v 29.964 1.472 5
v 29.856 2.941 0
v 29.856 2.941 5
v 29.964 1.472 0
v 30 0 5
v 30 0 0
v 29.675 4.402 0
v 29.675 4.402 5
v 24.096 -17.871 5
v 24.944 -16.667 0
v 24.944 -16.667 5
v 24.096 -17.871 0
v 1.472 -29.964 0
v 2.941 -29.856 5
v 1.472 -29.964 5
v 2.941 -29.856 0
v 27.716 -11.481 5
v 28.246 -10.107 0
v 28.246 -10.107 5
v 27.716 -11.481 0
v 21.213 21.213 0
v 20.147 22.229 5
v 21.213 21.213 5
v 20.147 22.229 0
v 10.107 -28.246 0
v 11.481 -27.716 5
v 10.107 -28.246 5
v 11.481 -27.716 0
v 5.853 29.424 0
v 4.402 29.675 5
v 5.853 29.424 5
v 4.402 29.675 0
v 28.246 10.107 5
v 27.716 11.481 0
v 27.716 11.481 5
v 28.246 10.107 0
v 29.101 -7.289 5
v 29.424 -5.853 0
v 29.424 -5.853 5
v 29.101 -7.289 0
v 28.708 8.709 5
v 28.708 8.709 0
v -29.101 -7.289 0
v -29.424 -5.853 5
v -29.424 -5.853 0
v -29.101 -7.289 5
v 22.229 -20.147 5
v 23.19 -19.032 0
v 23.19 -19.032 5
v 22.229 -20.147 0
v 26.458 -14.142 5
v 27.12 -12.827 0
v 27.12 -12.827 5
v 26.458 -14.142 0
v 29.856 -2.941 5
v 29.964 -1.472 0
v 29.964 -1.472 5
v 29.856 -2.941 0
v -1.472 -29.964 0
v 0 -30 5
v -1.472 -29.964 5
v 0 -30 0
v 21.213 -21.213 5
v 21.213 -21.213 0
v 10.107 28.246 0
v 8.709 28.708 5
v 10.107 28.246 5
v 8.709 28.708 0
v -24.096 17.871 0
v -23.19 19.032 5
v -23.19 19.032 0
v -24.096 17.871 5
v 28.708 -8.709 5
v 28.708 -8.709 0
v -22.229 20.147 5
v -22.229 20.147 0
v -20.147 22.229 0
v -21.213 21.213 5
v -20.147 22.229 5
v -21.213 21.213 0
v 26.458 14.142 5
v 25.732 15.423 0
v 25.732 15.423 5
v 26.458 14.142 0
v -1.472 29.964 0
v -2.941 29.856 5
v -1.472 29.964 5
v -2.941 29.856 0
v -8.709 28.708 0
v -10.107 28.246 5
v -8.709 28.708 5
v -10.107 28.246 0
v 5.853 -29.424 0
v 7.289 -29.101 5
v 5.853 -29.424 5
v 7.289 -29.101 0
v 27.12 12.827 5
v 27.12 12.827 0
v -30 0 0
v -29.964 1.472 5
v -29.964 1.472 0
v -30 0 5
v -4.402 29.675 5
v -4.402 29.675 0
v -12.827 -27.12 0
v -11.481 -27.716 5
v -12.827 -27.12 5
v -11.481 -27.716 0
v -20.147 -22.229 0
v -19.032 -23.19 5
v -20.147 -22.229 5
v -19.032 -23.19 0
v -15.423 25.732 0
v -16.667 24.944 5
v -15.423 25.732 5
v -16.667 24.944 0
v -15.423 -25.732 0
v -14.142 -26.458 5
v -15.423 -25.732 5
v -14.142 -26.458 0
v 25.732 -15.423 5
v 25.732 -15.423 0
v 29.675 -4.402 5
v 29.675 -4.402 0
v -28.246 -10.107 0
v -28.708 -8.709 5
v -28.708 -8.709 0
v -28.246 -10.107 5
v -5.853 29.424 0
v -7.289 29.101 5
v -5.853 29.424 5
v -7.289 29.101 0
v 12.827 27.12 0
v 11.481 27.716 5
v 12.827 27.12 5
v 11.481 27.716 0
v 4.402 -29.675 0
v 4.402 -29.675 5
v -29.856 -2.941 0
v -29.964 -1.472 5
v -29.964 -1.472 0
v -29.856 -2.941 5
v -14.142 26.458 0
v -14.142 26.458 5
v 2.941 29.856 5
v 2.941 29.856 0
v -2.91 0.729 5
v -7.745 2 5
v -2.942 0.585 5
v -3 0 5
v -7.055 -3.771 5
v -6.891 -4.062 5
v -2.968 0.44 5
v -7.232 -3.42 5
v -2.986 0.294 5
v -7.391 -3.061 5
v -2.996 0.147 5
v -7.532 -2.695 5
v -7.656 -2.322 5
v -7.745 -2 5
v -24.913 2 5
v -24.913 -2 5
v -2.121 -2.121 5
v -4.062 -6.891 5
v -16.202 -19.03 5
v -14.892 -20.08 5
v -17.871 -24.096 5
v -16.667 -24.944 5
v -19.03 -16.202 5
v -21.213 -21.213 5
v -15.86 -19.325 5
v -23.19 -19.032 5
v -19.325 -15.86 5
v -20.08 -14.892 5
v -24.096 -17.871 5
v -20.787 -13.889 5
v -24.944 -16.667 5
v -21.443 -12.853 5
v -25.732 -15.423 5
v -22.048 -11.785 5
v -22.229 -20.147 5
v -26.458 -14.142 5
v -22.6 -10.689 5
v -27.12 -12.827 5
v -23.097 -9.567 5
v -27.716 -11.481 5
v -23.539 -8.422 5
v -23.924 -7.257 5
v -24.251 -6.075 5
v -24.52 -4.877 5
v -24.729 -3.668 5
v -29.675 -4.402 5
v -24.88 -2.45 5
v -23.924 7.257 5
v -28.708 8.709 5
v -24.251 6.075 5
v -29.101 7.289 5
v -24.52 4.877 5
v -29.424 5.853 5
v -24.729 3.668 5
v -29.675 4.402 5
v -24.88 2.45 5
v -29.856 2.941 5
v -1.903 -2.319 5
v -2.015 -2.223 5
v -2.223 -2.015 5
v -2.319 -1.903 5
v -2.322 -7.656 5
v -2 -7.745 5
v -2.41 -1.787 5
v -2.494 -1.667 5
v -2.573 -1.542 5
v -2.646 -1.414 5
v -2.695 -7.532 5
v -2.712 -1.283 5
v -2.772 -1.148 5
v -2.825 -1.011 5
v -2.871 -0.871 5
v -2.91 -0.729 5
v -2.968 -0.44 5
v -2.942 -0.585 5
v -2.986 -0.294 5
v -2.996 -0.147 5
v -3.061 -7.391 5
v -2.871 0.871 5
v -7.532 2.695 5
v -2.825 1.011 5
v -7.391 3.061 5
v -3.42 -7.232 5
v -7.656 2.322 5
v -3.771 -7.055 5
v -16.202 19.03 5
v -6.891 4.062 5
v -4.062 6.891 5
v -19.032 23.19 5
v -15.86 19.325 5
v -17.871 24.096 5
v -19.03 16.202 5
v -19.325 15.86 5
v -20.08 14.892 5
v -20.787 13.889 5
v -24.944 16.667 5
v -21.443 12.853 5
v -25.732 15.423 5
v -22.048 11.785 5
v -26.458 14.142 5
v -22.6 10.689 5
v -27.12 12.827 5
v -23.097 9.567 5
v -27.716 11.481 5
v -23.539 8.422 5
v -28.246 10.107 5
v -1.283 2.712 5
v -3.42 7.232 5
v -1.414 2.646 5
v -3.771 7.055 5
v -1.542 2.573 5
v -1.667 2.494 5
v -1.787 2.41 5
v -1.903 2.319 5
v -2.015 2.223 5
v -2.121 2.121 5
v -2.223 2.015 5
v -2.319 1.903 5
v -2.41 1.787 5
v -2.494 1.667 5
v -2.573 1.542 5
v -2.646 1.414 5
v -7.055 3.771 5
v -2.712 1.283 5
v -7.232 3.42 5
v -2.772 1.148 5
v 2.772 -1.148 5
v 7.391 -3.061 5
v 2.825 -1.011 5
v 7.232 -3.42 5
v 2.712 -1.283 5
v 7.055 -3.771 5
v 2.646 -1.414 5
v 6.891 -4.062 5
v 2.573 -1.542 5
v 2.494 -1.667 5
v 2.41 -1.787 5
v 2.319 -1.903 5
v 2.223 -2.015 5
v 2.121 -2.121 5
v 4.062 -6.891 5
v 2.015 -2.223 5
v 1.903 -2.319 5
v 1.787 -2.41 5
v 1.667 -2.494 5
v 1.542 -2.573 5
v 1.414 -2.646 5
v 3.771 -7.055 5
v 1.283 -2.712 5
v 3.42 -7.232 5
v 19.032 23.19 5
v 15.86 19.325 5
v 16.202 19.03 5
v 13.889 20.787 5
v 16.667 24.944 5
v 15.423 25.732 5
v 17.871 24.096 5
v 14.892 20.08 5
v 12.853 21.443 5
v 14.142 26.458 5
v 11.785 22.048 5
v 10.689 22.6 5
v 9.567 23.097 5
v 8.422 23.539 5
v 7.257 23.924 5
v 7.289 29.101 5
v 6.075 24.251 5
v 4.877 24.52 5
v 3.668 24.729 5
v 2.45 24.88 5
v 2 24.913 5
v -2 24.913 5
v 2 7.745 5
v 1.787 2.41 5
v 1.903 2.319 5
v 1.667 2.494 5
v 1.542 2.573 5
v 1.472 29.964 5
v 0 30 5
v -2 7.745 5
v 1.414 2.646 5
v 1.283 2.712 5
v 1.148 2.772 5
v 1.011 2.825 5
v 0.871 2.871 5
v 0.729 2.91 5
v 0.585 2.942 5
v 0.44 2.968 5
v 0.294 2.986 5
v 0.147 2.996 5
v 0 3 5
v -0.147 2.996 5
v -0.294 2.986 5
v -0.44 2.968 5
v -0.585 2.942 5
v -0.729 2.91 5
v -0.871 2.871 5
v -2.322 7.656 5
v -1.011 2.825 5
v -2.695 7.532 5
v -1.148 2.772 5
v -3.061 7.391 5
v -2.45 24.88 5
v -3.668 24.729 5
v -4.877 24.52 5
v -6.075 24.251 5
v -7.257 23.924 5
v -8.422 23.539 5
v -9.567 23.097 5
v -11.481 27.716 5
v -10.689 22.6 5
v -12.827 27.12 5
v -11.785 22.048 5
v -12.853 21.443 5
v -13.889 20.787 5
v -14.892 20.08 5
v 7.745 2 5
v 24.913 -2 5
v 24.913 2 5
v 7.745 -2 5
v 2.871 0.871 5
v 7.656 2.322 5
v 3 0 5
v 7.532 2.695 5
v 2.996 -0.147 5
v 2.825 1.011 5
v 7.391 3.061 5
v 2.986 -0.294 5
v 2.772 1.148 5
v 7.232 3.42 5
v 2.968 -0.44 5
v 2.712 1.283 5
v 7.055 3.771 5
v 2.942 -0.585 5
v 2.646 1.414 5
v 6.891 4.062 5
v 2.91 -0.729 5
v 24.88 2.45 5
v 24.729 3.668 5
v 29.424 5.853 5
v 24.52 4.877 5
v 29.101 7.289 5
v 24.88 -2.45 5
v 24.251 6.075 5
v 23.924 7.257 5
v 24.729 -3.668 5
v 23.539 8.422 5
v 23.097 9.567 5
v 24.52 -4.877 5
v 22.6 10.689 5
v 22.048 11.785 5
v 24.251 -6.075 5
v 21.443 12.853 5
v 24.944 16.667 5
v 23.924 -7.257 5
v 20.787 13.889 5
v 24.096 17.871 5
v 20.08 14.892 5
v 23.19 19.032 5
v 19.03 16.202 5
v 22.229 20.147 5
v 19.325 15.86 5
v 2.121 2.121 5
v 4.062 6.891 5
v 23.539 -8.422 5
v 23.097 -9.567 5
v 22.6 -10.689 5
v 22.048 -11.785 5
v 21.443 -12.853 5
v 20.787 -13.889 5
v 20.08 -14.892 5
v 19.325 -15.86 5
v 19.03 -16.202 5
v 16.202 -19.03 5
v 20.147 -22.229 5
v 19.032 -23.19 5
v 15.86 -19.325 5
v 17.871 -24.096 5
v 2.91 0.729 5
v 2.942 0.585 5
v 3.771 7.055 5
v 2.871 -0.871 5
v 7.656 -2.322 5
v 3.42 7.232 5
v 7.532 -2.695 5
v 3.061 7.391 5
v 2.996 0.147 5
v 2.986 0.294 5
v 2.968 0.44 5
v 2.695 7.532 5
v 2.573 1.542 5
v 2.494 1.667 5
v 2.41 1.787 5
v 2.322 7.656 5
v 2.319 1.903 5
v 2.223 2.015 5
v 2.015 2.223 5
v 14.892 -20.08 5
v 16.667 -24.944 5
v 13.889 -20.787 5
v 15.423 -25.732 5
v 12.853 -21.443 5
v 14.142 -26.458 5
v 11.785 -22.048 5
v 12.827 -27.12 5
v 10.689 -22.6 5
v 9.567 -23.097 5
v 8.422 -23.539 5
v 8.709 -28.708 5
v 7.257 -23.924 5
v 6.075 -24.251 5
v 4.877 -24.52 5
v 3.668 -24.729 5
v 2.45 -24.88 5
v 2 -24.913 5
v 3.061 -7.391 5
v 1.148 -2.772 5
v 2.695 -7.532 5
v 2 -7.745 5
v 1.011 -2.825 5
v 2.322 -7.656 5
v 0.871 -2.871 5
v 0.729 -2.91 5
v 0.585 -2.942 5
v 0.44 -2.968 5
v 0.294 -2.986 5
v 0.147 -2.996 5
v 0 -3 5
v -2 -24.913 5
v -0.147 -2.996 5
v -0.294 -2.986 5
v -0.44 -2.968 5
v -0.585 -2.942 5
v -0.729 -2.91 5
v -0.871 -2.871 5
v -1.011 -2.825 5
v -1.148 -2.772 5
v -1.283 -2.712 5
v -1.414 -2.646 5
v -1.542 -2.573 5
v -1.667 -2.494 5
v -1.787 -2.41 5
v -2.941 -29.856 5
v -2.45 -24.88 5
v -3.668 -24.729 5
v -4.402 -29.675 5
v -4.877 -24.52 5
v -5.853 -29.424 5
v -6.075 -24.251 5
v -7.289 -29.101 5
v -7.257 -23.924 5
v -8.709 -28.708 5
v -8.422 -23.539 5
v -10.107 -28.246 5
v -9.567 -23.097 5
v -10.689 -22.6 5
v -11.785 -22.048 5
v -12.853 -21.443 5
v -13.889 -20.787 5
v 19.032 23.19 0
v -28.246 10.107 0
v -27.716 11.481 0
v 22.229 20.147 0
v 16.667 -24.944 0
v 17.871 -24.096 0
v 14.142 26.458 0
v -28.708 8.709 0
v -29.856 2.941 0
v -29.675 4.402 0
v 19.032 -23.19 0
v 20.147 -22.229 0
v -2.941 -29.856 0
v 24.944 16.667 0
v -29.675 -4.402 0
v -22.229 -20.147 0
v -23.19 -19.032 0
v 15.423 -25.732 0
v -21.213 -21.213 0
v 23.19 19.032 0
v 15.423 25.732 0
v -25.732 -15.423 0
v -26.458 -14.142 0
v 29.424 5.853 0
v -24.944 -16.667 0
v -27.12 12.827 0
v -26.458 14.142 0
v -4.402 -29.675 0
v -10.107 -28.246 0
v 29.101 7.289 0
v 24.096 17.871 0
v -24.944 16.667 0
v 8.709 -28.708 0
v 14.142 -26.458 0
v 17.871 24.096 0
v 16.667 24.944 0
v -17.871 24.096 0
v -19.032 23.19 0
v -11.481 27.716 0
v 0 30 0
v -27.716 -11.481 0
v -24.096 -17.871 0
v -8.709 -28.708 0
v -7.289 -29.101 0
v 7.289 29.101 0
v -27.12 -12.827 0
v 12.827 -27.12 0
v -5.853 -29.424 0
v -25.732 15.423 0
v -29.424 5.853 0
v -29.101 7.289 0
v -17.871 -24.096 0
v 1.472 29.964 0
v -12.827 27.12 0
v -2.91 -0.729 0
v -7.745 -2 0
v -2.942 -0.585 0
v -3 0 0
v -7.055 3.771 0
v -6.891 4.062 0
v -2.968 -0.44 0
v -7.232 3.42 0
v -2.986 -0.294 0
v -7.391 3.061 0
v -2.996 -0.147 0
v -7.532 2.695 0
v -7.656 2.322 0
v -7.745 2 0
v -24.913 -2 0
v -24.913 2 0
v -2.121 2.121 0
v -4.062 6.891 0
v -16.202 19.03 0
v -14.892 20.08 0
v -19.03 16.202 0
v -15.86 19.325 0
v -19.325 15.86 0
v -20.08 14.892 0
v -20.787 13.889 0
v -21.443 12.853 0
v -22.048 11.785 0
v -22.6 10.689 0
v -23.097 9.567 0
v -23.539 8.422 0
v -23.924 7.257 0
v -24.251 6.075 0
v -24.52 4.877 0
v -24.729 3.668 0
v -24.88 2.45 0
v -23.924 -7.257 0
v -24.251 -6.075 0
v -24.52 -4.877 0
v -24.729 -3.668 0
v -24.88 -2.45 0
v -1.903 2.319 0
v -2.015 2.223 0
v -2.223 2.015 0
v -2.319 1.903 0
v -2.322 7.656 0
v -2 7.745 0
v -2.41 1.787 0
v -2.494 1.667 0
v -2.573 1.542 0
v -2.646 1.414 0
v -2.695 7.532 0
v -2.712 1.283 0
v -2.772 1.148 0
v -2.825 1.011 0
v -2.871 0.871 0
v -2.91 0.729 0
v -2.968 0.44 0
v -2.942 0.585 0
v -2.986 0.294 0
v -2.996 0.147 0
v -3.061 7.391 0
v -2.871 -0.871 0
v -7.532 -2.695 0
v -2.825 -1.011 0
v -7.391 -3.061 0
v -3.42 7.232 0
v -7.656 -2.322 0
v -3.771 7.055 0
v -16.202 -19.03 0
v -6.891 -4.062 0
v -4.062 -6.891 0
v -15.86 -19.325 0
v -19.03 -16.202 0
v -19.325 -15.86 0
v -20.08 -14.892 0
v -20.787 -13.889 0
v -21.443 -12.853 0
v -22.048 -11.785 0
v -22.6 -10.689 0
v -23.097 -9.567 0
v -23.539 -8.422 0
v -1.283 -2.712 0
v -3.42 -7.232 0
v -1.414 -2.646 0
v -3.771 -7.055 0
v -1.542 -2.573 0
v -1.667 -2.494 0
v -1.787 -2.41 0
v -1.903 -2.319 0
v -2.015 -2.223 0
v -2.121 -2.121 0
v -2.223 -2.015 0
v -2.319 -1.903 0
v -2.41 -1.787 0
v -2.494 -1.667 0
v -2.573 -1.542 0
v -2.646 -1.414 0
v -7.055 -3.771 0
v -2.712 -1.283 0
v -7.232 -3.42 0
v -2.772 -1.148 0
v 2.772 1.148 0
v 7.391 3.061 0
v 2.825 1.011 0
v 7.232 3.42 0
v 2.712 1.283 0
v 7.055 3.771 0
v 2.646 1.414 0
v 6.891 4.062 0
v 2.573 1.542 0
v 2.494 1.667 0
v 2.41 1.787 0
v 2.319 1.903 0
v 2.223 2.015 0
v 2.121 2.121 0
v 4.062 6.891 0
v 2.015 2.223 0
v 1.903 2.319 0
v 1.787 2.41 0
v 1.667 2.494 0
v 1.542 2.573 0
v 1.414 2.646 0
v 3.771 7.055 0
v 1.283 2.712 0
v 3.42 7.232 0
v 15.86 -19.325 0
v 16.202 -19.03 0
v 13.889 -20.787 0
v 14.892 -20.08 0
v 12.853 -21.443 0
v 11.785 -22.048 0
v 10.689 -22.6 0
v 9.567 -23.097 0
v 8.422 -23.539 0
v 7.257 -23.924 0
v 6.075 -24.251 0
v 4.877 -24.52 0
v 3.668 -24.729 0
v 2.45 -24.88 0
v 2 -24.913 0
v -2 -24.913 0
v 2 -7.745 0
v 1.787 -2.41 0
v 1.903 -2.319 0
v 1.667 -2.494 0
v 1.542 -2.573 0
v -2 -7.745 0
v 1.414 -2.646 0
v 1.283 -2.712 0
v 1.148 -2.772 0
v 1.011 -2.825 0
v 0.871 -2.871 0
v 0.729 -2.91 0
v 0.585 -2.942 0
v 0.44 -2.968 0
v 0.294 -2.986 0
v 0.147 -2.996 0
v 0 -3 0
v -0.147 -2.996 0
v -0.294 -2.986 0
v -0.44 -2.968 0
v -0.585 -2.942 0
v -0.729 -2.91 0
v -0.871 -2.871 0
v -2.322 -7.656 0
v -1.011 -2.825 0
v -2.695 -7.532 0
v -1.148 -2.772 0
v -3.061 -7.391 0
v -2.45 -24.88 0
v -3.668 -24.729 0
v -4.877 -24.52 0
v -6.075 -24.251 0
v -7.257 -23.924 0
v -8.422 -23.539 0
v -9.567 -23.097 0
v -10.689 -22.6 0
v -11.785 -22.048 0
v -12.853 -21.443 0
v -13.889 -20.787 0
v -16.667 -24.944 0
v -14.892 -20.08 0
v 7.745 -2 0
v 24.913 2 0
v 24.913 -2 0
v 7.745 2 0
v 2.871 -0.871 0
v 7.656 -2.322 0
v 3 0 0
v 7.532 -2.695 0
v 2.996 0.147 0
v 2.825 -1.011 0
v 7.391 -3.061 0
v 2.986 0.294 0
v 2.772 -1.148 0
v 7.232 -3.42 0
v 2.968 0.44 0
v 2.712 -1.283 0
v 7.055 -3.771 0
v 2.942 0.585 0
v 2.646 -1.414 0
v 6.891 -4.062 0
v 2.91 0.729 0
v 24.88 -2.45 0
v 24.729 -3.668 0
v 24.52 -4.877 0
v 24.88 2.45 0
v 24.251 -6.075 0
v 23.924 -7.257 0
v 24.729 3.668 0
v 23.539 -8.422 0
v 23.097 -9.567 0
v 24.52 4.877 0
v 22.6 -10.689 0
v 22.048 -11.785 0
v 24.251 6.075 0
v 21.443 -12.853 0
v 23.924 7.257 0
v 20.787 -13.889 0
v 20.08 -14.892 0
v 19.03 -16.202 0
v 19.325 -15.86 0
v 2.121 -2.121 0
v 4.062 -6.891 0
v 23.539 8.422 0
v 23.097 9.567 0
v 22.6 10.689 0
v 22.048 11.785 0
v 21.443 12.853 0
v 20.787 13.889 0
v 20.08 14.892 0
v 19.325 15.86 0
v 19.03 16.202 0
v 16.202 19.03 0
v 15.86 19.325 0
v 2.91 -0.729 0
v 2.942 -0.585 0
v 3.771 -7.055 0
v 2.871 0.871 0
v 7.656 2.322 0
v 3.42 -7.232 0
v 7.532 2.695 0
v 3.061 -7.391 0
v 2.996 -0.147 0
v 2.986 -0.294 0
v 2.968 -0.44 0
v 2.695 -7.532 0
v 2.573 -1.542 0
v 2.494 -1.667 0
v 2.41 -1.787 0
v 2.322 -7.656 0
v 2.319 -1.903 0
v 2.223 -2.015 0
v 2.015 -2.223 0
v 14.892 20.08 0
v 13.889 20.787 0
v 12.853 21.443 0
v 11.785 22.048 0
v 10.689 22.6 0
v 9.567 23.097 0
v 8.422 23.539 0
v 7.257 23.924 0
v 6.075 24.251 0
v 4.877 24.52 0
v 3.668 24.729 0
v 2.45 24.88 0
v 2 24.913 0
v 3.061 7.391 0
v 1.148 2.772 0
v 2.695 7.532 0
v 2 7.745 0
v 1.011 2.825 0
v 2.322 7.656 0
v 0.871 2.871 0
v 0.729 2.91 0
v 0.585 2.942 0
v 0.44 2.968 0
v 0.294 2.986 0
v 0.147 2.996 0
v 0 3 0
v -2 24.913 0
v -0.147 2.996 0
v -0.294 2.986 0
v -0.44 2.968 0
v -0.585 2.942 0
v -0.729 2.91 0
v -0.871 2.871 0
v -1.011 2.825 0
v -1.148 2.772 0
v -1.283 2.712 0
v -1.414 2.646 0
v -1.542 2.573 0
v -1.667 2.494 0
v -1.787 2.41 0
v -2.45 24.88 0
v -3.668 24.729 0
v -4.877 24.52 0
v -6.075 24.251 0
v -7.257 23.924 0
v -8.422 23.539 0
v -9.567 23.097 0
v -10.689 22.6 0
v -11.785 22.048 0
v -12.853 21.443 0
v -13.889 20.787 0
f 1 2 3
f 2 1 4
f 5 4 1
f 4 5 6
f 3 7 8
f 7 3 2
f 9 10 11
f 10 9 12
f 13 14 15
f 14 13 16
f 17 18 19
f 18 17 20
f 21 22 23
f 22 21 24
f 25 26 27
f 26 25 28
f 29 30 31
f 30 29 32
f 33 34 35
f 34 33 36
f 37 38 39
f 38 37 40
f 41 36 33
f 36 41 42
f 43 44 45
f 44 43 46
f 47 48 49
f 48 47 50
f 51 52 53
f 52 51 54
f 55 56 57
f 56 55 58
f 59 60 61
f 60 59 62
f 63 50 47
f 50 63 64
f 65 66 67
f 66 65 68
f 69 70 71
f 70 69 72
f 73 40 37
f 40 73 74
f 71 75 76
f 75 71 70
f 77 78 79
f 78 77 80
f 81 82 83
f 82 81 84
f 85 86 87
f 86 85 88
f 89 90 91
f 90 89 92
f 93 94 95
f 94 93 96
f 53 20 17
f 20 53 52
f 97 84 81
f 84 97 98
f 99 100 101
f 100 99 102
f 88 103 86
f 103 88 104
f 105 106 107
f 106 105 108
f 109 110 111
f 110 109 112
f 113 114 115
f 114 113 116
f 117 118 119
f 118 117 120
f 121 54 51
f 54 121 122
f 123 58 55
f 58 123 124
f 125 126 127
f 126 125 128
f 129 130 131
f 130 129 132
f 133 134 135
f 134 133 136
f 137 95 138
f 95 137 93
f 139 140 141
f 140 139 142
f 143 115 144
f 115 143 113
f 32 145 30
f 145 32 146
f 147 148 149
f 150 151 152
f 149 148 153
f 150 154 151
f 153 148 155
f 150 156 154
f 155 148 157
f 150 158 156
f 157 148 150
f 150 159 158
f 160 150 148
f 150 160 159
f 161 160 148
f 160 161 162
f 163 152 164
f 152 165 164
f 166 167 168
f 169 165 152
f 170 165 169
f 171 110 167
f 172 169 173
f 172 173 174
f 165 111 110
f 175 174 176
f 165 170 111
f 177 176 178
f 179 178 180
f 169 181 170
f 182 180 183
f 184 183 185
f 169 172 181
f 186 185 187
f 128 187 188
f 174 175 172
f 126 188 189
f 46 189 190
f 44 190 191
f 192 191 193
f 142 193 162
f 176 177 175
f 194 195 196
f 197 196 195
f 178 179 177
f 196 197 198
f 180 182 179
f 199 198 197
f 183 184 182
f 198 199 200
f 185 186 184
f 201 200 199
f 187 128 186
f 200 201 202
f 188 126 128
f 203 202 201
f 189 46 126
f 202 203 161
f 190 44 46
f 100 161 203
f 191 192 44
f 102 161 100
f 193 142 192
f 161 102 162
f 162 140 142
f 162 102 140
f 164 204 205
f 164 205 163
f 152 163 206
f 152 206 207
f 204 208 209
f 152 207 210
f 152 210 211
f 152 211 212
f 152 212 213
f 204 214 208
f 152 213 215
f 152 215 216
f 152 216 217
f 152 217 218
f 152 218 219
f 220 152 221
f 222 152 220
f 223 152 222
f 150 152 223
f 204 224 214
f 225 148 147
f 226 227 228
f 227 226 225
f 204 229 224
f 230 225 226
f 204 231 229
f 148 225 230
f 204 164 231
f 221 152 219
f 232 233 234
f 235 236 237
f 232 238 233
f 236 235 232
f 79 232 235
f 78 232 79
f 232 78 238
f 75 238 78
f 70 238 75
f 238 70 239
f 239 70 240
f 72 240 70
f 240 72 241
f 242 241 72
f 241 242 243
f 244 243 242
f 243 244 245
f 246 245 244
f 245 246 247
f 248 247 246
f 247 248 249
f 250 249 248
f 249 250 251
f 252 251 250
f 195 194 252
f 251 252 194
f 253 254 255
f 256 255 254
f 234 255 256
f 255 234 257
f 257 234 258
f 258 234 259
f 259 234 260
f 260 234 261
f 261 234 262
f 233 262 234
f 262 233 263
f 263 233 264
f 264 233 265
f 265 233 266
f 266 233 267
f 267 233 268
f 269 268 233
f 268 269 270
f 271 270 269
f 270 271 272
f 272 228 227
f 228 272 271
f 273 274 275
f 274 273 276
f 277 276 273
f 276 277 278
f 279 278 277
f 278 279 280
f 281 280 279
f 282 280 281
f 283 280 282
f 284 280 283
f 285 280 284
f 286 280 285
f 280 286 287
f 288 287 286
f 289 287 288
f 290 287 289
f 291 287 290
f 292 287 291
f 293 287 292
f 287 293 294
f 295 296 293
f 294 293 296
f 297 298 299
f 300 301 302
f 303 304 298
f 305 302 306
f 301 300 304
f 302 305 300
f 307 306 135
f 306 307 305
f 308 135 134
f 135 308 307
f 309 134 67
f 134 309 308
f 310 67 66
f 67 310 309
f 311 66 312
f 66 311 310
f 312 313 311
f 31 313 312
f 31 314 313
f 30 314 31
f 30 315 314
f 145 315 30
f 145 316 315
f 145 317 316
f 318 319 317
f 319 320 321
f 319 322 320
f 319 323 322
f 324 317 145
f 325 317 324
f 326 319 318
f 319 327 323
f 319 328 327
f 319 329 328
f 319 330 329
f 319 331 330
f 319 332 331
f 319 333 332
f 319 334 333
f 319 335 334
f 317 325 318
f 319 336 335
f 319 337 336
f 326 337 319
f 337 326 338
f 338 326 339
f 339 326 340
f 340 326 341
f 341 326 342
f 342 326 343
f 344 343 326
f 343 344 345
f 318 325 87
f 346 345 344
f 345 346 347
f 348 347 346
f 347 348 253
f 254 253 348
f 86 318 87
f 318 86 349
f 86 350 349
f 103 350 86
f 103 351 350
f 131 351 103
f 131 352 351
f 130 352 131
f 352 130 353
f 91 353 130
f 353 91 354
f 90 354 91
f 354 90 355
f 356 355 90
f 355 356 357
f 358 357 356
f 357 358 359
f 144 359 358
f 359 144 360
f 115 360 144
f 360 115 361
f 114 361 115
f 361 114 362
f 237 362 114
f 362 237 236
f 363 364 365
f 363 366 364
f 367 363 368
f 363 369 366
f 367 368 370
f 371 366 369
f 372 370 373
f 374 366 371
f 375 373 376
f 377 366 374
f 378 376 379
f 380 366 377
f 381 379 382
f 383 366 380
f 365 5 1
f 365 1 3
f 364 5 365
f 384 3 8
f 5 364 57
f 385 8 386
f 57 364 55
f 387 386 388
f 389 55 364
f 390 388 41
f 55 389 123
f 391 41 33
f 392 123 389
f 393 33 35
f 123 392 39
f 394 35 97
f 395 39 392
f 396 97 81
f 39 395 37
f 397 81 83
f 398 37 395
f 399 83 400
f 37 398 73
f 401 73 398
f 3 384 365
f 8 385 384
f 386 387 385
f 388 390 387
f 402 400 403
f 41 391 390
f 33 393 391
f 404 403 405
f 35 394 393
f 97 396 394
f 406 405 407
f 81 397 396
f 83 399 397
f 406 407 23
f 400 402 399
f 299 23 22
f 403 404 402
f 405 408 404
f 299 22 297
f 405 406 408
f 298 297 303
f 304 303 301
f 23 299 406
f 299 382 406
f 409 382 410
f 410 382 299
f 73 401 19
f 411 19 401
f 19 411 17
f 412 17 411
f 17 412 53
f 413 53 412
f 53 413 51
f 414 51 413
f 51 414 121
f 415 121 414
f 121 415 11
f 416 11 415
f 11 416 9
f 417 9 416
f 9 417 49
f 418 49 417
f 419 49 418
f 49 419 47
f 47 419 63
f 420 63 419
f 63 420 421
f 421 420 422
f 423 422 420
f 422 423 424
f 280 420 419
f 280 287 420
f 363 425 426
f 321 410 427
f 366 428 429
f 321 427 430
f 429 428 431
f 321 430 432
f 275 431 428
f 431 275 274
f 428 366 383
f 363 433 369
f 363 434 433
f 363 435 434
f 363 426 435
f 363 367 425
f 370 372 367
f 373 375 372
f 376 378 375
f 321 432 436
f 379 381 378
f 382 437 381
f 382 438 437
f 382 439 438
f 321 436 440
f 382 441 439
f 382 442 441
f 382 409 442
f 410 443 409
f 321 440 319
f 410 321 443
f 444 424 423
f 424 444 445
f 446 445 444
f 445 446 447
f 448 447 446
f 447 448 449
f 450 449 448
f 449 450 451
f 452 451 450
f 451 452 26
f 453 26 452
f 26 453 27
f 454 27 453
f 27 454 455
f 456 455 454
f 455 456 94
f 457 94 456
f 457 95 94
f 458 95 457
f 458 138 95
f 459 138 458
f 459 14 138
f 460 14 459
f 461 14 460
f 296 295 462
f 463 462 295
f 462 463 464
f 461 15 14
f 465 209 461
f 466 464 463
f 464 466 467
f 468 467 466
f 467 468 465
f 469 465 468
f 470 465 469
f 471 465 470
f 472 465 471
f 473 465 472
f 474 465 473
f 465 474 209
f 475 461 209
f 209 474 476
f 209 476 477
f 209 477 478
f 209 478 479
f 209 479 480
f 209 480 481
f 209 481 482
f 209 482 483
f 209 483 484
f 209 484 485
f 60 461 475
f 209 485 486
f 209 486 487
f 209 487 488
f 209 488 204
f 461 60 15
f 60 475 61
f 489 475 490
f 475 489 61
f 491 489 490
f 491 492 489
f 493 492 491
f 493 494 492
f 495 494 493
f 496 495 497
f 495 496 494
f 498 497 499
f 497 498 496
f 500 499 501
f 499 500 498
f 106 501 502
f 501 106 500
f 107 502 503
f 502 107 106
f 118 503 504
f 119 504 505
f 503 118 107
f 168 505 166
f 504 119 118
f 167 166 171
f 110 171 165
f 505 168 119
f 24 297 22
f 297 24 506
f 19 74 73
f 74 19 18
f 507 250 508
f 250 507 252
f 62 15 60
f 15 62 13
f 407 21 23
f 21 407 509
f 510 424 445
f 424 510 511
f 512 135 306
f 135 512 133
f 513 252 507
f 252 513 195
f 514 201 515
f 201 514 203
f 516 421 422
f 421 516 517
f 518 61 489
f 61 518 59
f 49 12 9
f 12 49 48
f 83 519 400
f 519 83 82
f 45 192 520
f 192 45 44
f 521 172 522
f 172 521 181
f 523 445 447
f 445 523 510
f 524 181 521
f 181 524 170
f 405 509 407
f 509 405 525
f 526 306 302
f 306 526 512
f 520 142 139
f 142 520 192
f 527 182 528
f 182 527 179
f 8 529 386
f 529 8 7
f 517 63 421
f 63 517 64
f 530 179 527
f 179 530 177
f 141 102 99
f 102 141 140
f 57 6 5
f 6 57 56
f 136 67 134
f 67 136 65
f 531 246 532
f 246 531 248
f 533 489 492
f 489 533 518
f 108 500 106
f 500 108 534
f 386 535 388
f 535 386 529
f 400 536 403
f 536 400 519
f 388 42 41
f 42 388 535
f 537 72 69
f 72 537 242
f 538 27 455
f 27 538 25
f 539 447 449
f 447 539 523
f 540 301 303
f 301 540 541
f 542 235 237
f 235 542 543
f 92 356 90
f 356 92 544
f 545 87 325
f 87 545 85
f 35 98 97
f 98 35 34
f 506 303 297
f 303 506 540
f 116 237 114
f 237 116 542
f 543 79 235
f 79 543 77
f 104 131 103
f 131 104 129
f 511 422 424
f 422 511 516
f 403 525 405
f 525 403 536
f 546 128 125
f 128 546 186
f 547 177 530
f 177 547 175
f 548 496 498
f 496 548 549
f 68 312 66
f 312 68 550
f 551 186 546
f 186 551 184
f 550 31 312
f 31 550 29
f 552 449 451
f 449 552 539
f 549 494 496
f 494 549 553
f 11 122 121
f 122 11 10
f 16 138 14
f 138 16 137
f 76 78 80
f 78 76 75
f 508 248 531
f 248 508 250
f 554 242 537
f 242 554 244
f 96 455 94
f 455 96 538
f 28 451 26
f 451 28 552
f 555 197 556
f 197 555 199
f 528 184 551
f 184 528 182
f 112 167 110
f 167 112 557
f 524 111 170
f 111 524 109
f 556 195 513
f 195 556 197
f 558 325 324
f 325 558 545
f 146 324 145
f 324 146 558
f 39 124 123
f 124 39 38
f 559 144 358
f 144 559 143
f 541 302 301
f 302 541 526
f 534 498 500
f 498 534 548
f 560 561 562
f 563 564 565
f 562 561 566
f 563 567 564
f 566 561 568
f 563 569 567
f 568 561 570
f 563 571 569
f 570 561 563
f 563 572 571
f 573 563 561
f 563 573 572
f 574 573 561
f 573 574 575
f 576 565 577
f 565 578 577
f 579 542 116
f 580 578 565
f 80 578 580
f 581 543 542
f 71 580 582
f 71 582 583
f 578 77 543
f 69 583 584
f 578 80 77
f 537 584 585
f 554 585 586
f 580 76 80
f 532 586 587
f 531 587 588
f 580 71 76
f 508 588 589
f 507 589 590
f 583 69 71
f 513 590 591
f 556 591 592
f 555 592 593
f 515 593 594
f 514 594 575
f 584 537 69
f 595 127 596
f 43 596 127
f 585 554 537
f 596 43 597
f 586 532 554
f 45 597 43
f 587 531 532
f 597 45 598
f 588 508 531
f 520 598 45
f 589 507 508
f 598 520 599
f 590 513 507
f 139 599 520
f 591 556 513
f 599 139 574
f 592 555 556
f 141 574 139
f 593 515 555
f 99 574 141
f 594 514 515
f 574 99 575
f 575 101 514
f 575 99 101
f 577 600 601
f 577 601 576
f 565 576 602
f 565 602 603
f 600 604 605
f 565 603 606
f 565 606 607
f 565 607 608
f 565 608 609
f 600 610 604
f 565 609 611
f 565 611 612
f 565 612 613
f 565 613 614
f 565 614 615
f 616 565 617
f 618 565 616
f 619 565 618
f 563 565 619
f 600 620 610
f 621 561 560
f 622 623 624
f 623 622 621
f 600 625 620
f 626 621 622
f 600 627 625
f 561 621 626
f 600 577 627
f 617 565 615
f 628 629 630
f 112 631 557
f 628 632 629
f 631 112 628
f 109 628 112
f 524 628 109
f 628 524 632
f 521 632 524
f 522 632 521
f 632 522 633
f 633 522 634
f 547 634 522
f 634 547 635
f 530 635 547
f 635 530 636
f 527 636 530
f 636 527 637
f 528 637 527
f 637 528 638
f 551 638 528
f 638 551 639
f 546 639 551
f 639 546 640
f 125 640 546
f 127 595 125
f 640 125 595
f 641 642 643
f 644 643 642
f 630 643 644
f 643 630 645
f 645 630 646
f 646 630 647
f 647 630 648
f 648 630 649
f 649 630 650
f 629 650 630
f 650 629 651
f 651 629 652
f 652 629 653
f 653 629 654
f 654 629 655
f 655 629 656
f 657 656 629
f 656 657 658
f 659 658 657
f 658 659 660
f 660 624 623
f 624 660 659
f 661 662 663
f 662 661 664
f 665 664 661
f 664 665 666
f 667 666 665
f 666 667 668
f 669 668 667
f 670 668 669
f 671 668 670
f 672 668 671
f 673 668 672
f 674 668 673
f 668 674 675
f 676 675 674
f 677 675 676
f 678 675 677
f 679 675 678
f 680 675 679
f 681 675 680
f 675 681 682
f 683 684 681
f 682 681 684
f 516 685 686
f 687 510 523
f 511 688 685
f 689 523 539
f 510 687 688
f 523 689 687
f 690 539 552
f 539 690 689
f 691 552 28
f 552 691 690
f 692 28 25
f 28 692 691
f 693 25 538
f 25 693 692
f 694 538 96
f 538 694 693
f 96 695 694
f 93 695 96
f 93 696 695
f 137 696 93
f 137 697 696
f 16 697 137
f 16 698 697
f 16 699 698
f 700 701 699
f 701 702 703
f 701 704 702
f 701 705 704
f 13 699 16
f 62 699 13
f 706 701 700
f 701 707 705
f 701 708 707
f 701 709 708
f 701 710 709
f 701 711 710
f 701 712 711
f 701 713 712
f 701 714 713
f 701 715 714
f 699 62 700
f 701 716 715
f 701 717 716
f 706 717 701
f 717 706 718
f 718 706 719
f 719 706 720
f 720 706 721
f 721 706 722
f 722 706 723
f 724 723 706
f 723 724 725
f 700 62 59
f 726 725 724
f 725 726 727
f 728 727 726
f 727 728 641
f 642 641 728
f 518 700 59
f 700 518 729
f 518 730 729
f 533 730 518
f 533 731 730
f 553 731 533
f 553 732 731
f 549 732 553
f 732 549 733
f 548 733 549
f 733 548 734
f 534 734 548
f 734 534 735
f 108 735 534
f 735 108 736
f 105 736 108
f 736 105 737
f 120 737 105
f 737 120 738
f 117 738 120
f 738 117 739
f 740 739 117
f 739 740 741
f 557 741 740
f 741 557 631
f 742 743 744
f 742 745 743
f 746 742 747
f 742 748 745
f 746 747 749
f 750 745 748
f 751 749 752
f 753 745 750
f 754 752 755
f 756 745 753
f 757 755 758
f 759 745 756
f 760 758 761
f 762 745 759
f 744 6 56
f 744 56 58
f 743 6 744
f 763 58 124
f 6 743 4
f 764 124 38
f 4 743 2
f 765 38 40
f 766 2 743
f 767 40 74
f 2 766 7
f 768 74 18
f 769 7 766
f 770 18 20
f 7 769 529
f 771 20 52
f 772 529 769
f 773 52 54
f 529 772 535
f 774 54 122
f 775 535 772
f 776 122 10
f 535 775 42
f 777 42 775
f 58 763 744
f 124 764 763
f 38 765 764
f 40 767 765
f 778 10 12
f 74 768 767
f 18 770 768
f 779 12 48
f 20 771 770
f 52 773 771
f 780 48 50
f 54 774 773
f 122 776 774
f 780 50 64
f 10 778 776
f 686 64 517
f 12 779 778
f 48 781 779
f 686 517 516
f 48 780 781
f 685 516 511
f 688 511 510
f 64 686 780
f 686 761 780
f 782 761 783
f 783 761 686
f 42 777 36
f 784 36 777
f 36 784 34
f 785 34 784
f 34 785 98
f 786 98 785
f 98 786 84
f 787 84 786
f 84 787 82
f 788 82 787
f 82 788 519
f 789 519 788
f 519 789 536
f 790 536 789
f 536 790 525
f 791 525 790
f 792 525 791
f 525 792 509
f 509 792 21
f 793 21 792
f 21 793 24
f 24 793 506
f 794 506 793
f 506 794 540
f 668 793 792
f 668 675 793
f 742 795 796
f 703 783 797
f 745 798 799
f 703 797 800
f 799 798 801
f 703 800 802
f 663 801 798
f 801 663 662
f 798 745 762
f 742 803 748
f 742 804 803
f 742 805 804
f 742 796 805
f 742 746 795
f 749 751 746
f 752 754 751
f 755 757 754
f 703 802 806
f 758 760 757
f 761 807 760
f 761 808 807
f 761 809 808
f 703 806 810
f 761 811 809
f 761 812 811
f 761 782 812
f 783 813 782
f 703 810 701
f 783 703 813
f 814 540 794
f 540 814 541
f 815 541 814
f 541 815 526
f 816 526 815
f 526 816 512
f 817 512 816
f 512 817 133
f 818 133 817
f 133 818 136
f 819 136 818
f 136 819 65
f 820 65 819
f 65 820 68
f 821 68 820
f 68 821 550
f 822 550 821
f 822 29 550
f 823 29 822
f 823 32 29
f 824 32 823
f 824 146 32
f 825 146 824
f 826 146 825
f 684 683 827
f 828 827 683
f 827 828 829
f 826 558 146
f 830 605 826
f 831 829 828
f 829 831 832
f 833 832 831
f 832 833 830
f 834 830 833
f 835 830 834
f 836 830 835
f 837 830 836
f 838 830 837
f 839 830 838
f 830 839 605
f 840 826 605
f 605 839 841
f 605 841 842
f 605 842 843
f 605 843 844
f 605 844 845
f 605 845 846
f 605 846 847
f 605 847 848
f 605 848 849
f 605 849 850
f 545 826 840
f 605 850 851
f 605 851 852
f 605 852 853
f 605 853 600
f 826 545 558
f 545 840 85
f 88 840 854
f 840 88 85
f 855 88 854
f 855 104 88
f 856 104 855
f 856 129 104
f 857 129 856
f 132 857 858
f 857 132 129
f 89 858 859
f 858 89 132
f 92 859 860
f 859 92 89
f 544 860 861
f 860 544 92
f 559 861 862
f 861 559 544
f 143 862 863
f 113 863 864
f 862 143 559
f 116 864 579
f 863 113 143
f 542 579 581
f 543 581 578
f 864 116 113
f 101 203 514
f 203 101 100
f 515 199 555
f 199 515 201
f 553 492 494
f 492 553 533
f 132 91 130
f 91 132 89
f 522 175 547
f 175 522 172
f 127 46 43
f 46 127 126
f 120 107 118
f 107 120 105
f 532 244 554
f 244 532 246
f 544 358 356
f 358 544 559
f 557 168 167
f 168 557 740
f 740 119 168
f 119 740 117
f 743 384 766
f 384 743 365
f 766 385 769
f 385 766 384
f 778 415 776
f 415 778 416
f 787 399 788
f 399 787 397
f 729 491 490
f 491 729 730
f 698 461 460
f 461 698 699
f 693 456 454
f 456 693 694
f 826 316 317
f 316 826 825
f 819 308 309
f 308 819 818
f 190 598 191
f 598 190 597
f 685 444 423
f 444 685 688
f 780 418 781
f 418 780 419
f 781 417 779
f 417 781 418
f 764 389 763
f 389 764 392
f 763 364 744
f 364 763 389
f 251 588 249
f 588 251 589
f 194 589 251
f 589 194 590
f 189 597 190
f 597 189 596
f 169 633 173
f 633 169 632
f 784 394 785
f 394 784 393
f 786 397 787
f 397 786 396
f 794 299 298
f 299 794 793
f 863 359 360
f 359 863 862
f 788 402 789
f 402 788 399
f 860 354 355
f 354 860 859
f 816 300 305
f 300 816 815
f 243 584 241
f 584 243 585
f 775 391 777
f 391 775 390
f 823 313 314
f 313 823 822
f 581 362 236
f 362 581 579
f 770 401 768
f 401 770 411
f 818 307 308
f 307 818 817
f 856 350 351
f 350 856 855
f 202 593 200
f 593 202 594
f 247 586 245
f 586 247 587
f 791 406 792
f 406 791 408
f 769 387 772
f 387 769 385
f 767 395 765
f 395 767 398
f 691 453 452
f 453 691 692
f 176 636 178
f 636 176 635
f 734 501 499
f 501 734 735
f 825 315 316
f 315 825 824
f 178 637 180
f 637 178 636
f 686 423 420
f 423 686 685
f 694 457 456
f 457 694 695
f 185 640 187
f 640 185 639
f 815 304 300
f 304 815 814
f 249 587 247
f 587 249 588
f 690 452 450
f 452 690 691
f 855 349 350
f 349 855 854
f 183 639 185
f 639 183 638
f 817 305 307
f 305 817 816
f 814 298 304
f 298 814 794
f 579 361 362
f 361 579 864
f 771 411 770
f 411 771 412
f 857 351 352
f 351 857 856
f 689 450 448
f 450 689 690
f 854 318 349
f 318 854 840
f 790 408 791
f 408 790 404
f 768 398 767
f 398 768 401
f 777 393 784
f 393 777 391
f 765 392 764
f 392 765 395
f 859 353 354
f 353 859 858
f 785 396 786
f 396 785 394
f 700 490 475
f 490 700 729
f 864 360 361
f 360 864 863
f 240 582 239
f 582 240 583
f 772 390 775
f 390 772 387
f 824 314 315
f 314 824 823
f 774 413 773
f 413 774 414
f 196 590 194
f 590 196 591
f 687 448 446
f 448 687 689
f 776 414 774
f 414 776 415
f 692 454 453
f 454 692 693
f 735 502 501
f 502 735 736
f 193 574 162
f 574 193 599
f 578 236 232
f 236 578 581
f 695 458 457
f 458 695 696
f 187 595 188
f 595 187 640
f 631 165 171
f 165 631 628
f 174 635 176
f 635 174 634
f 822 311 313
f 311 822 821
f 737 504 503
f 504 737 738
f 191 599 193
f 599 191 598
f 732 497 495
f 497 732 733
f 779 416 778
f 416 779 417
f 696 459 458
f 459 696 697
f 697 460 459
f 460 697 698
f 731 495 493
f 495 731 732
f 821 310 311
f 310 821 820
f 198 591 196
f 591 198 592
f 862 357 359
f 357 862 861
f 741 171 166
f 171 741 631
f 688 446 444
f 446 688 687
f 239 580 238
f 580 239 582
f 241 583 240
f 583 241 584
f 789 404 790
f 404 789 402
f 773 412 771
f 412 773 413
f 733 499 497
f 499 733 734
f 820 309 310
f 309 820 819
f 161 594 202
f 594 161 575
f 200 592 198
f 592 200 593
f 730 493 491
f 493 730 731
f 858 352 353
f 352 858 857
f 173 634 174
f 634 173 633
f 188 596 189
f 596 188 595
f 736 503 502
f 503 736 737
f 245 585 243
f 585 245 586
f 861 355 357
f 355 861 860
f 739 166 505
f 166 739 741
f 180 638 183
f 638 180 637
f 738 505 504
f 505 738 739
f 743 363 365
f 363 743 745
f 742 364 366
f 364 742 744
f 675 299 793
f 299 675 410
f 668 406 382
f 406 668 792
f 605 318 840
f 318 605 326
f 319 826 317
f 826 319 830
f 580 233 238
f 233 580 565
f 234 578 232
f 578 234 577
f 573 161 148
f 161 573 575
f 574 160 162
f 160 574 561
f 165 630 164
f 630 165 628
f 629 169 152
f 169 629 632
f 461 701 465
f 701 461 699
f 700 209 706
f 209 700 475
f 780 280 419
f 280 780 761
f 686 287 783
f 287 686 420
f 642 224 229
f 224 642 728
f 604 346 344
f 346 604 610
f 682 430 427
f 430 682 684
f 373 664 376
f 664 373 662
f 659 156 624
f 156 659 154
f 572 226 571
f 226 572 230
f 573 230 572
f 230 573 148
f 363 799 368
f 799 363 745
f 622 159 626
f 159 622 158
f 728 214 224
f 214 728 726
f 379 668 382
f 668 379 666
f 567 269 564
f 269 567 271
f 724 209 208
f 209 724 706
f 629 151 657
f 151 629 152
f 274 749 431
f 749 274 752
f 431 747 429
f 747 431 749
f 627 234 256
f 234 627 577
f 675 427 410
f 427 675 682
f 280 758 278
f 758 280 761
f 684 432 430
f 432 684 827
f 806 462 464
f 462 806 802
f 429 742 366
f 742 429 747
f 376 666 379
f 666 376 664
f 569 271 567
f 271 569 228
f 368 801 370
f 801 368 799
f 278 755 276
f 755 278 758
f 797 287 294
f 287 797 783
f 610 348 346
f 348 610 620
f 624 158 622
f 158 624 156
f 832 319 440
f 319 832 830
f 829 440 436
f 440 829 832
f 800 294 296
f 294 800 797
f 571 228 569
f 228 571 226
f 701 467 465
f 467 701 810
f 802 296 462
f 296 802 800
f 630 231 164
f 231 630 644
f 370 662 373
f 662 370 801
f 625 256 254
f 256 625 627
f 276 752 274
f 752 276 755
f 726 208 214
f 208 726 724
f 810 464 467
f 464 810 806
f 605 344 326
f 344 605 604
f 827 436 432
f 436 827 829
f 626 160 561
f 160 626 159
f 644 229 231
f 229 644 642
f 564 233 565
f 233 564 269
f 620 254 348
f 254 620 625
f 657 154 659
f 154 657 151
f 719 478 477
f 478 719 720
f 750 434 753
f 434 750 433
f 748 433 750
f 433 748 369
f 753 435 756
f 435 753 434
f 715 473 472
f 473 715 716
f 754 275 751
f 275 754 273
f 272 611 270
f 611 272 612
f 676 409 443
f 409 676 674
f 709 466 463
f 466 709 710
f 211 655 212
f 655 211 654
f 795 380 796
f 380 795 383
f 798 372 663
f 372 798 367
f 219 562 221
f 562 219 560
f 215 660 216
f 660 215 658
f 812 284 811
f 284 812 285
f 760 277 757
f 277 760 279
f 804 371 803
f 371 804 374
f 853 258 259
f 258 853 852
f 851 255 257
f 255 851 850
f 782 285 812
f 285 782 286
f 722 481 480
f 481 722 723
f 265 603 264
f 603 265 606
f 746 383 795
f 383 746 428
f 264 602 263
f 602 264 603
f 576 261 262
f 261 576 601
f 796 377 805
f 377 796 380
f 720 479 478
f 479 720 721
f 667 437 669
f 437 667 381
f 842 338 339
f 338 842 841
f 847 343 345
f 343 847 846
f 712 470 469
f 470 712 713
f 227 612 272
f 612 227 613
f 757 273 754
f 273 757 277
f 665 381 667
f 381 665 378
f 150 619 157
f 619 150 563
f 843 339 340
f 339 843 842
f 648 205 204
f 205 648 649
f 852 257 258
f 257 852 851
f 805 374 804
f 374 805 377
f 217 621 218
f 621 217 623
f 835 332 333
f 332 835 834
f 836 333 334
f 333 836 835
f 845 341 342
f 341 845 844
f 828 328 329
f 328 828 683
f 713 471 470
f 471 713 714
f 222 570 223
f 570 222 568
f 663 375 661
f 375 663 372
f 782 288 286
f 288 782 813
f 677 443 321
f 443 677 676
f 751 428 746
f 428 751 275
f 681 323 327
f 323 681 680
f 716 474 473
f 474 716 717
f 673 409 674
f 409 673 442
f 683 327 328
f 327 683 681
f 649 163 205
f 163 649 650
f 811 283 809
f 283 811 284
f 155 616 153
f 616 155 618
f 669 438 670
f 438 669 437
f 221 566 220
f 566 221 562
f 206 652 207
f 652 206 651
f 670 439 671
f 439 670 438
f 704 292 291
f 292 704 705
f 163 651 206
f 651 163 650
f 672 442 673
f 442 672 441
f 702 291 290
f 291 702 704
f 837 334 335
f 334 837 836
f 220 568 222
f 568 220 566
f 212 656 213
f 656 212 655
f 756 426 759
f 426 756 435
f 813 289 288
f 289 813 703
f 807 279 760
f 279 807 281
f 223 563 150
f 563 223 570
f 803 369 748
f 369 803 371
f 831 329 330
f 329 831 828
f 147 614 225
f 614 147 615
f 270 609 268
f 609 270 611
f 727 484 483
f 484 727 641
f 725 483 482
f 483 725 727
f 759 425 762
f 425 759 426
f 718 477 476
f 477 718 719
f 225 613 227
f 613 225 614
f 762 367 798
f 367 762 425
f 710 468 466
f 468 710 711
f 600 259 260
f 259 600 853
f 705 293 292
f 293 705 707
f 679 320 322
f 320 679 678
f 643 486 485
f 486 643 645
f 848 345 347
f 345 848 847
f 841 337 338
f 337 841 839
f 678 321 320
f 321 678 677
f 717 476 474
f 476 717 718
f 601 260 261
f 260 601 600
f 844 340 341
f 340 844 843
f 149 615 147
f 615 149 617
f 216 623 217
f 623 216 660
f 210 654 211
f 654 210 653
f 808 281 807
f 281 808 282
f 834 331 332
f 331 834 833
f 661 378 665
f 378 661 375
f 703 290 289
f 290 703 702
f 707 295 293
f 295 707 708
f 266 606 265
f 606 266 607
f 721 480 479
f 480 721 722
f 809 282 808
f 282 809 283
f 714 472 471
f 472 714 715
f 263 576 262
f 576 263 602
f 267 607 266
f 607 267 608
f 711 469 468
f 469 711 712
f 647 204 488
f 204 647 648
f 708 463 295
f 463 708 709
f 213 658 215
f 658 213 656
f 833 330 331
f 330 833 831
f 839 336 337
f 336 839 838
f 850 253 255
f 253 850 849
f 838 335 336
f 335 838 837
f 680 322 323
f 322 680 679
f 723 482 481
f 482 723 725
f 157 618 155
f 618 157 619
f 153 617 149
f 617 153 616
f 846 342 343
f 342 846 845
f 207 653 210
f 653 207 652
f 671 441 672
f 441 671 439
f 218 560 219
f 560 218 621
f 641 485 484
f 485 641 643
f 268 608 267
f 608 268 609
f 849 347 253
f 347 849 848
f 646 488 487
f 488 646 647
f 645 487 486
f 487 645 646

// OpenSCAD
// Spoked wheel for a small sample cart
// Flat part, prints lying on the bed, centred on origin

// ---------------- Parameters ----------------
thickness      = 5;    // wheel thickness (Z)
rim_od         = 60;   // rim outer diameter
rim_width      = 5;    // rim radial width
hub_d          = 16;   // hub diameter
axle_d         = 6;    // axle hole diameter
spoke_count    = 8;    // number of spokes
spoke_width    = 4;    // spoke width
spoke_start_ang = 0;   // first spoke along +X
eps            = 0.5;  // cut overlap past faces
overlap        = 0.5;  // spoke overlap into hub/rim for clean union
$fn            = 128;  // curve resolution

// ---------------- Derived ----------------
rim_or = rim_od / 2;              // rim outer radius
rim_ir = rim_or - rim_width;      // rim inner radius
hub_r  = hub_d / 2;               // hub radius
spoke_r0 = hub_r - overlap;       // spoke start radius
spoke_r1 = rim_ir + overlap;      // spoke end radius

// ---------------- Model ----------------
difference() {
    union() {
        // Rim
        difference() {
            cylinder(h = thickness, r = rim_or);
            translate([0, 0, -eps])
                cylinder(h = thickness + 2 * eps, r = rim_ir);
        }

        // Hub
        cylinder(h = thickness, r = hub_r);

        // Spokes
        for (i = [0 : spoke_count - 1])
            rotate([0, 0, spoke_start_ang + i * 360 / spoke_count])
                translate([spoke_r0, -spoke_width / 2, 0])
                    cube([spoke_r1 - spoke_r0, spoke_width, thickness]);
    }

    // Axle hole
    translate([0, 0, -eps])
        cylinder(h = thickness + 2 * eps, d = axle_d);
}
